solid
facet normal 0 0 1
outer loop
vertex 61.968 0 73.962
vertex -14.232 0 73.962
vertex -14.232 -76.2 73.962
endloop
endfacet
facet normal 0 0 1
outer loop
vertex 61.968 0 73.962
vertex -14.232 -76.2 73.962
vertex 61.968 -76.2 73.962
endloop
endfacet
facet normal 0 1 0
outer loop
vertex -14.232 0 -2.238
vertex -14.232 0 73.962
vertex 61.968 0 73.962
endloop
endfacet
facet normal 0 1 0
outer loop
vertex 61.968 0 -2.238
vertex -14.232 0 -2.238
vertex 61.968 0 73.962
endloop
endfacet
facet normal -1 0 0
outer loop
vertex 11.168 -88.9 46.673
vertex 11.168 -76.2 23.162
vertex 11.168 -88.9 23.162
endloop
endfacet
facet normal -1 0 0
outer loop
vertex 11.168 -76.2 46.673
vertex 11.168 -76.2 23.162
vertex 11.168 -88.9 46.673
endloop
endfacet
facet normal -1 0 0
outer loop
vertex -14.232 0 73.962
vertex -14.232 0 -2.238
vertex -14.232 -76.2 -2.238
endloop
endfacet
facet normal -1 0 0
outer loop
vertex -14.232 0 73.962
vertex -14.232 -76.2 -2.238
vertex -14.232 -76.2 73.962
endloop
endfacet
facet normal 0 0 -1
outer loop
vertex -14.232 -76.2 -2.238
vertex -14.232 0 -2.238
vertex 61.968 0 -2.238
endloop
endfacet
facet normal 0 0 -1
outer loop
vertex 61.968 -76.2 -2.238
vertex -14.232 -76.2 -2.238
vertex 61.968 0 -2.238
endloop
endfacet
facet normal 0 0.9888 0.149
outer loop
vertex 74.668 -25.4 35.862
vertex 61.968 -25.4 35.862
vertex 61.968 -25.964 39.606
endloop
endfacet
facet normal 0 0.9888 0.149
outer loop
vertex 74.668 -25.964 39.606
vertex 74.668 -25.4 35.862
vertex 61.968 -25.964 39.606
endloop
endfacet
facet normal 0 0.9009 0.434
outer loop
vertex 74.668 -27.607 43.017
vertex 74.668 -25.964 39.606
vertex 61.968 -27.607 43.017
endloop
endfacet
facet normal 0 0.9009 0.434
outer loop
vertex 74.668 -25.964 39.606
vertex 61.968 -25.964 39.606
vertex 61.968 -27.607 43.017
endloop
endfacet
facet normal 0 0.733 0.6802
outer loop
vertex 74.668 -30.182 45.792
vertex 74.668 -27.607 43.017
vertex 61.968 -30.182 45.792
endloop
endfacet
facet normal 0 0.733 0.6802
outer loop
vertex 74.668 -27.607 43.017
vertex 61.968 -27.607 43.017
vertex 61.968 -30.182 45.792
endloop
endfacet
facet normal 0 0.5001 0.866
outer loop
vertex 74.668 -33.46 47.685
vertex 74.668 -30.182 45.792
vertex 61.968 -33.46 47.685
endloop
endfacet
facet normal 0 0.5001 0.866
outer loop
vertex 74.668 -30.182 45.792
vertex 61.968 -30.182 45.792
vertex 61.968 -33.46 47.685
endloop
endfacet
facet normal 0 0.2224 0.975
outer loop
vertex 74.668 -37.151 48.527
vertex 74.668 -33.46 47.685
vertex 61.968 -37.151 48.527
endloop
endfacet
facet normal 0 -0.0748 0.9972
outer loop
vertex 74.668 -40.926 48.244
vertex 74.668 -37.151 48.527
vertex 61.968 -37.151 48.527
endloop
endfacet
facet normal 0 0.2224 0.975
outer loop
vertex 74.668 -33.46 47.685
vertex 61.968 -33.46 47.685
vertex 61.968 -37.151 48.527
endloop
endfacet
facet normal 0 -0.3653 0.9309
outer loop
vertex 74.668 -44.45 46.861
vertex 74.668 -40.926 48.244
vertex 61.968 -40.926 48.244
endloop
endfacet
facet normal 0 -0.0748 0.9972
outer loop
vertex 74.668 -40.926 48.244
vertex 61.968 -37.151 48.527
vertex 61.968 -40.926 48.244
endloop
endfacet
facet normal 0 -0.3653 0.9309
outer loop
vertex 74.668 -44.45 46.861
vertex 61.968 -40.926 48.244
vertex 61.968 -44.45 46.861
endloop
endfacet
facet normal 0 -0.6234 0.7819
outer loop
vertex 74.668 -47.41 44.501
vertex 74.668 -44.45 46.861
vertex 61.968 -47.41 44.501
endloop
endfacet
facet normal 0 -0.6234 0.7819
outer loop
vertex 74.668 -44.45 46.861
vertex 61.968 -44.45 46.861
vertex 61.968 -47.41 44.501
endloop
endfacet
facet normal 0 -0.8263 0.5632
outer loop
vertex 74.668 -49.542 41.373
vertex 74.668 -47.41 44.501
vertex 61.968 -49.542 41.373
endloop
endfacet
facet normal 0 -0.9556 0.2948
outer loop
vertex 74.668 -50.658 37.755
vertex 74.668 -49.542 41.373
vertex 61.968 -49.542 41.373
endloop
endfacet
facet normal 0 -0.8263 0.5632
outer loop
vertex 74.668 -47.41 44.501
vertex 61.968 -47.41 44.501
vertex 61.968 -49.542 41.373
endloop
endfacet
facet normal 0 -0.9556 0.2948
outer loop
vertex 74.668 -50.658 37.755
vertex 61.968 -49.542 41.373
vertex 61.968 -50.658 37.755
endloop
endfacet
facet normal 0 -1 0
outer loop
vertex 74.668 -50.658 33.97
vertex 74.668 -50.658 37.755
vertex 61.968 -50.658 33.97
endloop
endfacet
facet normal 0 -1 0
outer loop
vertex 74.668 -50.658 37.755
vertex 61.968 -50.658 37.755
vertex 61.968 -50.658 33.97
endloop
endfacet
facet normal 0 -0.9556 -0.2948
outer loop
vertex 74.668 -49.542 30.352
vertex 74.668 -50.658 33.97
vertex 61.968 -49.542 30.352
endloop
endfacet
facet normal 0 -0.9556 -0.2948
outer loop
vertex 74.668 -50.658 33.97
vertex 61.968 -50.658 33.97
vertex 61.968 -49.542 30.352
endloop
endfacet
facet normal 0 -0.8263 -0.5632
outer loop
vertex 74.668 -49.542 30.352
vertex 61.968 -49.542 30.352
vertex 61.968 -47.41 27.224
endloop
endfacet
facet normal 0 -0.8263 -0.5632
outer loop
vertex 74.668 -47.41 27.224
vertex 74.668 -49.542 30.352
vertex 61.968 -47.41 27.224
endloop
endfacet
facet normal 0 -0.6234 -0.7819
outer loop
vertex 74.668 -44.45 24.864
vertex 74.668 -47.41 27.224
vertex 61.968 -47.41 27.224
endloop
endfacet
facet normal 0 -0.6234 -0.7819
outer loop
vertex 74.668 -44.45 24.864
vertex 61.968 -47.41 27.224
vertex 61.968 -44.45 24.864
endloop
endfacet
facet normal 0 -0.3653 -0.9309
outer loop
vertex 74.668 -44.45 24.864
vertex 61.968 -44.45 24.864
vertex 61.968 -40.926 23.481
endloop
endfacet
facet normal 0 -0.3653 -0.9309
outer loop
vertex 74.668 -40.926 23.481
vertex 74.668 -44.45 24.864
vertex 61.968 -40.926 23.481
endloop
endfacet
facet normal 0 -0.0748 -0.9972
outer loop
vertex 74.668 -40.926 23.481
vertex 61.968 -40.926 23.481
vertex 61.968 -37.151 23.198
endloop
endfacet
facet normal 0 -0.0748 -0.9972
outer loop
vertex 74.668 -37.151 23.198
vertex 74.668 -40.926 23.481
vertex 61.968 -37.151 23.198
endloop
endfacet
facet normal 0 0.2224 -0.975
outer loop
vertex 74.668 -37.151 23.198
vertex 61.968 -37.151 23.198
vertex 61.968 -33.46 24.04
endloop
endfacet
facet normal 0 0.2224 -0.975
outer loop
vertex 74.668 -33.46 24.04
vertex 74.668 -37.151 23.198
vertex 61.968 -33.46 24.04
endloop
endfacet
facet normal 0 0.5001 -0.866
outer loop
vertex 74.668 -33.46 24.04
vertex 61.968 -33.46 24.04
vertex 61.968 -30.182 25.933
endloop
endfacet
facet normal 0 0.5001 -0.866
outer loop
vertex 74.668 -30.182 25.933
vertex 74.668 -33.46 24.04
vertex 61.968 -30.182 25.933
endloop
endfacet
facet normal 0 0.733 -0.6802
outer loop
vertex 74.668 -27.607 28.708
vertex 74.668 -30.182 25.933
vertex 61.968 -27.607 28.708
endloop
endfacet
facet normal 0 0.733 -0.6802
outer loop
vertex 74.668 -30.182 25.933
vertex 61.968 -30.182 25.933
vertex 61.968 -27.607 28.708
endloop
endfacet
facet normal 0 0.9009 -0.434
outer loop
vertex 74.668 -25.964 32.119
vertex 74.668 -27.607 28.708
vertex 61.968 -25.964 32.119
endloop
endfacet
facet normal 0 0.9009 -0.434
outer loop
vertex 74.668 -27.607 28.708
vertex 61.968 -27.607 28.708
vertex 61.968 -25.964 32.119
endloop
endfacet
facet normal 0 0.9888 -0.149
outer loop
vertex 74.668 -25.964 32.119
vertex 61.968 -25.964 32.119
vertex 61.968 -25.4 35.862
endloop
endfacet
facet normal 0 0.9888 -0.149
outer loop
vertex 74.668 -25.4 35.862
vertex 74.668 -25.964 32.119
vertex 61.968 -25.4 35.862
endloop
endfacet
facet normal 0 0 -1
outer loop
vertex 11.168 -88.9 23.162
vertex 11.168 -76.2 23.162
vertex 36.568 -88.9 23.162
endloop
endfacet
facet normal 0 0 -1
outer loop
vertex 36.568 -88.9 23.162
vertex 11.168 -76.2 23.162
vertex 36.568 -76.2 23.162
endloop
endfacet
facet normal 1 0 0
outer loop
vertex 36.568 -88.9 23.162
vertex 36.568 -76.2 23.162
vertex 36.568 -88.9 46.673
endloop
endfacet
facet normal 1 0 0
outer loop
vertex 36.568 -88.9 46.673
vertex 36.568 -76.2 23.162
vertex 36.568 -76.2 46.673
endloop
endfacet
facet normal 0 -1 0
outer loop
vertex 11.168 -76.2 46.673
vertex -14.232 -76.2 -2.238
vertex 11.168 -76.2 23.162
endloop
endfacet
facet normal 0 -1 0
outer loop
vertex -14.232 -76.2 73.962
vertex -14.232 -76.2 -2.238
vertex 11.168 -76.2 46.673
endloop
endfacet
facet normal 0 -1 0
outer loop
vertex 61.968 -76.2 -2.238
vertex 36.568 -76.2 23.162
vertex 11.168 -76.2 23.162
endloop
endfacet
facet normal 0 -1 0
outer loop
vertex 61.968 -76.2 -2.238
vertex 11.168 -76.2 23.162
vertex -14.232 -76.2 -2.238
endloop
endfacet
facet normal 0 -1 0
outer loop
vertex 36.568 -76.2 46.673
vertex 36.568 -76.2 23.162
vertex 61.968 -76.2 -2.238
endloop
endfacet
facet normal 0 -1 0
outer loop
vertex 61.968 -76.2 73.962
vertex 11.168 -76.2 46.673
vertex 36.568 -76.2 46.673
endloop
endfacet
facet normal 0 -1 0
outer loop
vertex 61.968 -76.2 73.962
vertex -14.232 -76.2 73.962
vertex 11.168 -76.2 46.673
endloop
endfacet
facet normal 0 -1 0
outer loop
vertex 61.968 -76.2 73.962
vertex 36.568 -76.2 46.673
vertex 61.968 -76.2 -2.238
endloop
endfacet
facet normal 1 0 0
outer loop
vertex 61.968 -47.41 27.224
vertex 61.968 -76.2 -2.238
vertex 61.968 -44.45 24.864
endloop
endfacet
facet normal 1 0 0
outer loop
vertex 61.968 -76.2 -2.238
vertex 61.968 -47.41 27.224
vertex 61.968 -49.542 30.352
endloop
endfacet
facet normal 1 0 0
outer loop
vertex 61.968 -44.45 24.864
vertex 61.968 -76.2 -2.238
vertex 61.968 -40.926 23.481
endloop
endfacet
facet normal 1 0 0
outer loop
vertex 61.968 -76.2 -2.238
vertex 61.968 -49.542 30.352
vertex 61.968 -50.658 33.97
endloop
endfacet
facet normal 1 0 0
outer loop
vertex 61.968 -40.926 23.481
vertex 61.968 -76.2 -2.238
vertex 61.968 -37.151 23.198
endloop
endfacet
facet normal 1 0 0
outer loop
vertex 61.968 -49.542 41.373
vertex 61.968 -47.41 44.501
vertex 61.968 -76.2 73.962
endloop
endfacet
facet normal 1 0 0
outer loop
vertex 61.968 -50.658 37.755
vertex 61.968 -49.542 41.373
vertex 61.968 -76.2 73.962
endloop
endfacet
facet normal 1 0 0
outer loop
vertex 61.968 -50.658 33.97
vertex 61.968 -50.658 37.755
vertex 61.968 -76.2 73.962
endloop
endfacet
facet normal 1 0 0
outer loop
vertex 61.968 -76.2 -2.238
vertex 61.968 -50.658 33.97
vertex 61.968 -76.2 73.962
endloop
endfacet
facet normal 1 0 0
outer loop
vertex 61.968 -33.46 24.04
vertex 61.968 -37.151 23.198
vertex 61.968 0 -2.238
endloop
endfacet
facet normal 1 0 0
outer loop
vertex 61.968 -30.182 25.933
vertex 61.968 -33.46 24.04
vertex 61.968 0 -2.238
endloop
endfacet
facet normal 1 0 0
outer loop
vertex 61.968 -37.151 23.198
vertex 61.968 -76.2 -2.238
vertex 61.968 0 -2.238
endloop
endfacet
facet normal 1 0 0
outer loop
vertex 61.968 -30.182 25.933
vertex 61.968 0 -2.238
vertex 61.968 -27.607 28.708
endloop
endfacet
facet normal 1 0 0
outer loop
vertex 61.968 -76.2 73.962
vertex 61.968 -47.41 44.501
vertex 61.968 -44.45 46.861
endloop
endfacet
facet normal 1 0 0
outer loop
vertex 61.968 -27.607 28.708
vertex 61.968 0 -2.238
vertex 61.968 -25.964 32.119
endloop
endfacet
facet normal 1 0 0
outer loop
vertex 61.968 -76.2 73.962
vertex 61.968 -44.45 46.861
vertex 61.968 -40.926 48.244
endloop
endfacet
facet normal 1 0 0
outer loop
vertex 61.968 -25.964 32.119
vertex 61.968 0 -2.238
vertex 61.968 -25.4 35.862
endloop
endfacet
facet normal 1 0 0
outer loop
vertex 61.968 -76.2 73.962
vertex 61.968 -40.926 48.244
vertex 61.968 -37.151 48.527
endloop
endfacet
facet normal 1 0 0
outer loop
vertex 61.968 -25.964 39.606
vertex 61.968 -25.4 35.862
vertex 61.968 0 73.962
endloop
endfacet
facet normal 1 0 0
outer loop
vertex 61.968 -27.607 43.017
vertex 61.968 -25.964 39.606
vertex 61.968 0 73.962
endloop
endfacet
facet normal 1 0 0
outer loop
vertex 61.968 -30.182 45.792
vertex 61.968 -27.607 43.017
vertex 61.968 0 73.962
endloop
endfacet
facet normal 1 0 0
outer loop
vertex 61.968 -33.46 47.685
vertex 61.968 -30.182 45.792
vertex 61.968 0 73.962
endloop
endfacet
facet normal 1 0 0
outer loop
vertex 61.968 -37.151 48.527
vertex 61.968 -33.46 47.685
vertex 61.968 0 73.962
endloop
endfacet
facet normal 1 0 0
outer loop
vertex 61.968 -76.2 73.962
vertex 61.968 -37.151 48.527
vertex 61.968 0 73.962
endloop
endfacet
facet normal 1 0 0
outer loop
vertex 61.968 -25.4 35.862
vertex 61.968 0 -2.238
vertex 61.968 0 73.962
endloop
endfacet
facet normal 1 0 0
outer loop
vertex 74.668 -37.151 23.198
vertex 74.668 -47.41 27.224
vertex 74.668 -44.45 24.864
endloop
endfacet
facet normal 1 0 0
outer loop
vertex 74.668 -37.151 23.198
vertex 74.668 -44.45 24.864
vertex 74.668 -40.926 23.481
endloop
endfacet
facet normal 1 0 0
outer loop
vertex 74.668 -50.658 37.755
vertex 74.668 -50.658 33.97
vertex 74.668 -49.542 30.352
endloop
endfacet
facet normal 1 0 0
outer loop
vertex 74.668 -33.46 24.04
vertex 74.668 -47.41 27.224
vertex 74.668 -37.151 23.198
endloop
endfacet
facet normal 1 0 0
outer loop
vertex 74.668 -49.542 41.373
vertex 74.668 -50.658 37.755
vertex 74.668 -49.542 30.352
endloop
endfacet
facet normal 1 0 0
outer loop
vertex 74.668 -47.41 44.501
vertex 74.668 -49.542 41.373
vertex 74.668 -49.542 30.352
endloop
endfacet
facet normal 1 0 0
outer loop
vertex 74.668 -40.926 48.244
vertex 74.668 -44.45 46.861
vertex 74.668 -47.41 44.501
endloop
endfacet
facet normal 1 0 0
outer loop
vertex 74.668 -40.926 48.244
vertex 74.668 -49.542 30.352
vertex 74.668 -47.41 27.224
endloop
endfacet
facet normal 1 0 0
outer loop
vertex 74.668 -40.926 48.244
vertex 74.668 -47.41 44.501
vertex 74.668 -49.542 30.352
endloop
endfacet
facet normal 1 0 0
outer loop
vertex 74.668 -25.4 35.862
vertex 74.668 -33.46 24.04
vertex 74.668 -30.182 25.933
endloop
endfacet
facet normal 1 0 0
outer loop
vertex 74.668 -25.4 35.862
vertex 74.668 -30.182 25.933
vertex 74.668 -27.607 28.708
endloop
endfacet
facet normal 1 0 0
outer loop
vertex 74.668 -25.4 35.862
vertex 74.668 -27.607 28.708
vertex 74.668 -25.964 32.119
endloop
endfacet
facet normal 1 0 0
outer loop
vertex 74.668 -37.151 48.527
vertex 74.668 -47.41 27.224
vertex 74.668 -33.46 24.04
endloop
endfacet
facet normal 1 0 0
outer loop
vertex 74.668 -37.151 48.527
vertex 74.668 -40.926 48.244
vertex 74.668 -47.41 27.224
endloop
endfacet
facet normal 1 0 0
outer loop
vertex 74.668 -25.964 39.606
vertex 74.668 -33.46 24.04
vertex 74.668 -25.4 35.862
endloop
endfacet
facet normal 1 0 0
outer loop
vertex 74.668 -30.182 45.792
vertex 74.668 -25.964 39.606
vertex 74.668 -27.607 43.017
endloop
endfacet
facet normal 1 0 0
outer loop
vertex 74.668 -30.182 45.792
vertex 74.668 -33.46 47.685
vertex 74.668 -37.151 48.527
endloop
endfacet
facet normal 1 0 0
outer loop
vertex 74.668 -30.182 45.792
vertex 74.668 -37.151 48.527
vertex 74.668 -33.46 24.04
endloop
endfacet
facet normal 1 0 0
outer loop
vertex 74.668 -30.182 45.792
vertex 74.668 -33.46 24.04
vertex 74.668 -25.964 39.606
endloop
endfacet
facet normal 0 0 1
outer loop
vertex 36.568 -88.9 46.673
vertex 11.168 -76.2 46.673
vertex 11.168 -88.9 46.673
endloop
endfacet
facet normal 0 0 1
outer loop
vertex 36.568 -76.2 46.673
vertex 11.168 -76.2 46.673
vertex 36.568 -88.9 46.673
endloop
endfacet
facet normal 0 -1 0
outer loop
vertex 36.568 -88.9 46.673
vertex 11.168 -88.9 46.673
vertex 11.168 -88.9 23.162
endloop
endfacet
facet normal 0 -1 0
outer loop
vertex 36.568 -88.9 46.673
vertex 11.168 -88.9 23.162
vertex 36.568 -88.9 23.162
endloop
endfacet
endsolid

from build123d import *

# Parameters (mm, degrees)
F0_W     = 76.2
F0_H     = 76.2
F1_DEPTH = 76.2
F2_W     = 25.4
F2_H     = 23.510535
F3_DEPTH = 12.7
F4_R     = 12.7
F5_DEPTH = 12.7


with BuildPart() as f1:
    # F0 (on Front) → F1 (new body)
    with BuildSketch(Plane.XZ):
        with Locations((23.867505, 35.862454)):
            Rectangle(F0_W, F0_H)
    extrude(amount=F1_DEPTH)

    # F2 (on face) → F3 (join)
    with BuildSketch(Plane.XZ.offset(76.2)):
        with Locations((23.867505, 34.917721)):
            Rectangle(F2_W, F2_H)
    extrude(amount=F3_DEPTH)

    # F4 (on face) → F5 (join)
    with BuildSketch(Plane.YZ.offset(61.967505)):
        with Locations((-38.1, 35.862454)):
            Circle(F4_R)
    extrude(amount=F5_DEPTH)


solid = f1.part
